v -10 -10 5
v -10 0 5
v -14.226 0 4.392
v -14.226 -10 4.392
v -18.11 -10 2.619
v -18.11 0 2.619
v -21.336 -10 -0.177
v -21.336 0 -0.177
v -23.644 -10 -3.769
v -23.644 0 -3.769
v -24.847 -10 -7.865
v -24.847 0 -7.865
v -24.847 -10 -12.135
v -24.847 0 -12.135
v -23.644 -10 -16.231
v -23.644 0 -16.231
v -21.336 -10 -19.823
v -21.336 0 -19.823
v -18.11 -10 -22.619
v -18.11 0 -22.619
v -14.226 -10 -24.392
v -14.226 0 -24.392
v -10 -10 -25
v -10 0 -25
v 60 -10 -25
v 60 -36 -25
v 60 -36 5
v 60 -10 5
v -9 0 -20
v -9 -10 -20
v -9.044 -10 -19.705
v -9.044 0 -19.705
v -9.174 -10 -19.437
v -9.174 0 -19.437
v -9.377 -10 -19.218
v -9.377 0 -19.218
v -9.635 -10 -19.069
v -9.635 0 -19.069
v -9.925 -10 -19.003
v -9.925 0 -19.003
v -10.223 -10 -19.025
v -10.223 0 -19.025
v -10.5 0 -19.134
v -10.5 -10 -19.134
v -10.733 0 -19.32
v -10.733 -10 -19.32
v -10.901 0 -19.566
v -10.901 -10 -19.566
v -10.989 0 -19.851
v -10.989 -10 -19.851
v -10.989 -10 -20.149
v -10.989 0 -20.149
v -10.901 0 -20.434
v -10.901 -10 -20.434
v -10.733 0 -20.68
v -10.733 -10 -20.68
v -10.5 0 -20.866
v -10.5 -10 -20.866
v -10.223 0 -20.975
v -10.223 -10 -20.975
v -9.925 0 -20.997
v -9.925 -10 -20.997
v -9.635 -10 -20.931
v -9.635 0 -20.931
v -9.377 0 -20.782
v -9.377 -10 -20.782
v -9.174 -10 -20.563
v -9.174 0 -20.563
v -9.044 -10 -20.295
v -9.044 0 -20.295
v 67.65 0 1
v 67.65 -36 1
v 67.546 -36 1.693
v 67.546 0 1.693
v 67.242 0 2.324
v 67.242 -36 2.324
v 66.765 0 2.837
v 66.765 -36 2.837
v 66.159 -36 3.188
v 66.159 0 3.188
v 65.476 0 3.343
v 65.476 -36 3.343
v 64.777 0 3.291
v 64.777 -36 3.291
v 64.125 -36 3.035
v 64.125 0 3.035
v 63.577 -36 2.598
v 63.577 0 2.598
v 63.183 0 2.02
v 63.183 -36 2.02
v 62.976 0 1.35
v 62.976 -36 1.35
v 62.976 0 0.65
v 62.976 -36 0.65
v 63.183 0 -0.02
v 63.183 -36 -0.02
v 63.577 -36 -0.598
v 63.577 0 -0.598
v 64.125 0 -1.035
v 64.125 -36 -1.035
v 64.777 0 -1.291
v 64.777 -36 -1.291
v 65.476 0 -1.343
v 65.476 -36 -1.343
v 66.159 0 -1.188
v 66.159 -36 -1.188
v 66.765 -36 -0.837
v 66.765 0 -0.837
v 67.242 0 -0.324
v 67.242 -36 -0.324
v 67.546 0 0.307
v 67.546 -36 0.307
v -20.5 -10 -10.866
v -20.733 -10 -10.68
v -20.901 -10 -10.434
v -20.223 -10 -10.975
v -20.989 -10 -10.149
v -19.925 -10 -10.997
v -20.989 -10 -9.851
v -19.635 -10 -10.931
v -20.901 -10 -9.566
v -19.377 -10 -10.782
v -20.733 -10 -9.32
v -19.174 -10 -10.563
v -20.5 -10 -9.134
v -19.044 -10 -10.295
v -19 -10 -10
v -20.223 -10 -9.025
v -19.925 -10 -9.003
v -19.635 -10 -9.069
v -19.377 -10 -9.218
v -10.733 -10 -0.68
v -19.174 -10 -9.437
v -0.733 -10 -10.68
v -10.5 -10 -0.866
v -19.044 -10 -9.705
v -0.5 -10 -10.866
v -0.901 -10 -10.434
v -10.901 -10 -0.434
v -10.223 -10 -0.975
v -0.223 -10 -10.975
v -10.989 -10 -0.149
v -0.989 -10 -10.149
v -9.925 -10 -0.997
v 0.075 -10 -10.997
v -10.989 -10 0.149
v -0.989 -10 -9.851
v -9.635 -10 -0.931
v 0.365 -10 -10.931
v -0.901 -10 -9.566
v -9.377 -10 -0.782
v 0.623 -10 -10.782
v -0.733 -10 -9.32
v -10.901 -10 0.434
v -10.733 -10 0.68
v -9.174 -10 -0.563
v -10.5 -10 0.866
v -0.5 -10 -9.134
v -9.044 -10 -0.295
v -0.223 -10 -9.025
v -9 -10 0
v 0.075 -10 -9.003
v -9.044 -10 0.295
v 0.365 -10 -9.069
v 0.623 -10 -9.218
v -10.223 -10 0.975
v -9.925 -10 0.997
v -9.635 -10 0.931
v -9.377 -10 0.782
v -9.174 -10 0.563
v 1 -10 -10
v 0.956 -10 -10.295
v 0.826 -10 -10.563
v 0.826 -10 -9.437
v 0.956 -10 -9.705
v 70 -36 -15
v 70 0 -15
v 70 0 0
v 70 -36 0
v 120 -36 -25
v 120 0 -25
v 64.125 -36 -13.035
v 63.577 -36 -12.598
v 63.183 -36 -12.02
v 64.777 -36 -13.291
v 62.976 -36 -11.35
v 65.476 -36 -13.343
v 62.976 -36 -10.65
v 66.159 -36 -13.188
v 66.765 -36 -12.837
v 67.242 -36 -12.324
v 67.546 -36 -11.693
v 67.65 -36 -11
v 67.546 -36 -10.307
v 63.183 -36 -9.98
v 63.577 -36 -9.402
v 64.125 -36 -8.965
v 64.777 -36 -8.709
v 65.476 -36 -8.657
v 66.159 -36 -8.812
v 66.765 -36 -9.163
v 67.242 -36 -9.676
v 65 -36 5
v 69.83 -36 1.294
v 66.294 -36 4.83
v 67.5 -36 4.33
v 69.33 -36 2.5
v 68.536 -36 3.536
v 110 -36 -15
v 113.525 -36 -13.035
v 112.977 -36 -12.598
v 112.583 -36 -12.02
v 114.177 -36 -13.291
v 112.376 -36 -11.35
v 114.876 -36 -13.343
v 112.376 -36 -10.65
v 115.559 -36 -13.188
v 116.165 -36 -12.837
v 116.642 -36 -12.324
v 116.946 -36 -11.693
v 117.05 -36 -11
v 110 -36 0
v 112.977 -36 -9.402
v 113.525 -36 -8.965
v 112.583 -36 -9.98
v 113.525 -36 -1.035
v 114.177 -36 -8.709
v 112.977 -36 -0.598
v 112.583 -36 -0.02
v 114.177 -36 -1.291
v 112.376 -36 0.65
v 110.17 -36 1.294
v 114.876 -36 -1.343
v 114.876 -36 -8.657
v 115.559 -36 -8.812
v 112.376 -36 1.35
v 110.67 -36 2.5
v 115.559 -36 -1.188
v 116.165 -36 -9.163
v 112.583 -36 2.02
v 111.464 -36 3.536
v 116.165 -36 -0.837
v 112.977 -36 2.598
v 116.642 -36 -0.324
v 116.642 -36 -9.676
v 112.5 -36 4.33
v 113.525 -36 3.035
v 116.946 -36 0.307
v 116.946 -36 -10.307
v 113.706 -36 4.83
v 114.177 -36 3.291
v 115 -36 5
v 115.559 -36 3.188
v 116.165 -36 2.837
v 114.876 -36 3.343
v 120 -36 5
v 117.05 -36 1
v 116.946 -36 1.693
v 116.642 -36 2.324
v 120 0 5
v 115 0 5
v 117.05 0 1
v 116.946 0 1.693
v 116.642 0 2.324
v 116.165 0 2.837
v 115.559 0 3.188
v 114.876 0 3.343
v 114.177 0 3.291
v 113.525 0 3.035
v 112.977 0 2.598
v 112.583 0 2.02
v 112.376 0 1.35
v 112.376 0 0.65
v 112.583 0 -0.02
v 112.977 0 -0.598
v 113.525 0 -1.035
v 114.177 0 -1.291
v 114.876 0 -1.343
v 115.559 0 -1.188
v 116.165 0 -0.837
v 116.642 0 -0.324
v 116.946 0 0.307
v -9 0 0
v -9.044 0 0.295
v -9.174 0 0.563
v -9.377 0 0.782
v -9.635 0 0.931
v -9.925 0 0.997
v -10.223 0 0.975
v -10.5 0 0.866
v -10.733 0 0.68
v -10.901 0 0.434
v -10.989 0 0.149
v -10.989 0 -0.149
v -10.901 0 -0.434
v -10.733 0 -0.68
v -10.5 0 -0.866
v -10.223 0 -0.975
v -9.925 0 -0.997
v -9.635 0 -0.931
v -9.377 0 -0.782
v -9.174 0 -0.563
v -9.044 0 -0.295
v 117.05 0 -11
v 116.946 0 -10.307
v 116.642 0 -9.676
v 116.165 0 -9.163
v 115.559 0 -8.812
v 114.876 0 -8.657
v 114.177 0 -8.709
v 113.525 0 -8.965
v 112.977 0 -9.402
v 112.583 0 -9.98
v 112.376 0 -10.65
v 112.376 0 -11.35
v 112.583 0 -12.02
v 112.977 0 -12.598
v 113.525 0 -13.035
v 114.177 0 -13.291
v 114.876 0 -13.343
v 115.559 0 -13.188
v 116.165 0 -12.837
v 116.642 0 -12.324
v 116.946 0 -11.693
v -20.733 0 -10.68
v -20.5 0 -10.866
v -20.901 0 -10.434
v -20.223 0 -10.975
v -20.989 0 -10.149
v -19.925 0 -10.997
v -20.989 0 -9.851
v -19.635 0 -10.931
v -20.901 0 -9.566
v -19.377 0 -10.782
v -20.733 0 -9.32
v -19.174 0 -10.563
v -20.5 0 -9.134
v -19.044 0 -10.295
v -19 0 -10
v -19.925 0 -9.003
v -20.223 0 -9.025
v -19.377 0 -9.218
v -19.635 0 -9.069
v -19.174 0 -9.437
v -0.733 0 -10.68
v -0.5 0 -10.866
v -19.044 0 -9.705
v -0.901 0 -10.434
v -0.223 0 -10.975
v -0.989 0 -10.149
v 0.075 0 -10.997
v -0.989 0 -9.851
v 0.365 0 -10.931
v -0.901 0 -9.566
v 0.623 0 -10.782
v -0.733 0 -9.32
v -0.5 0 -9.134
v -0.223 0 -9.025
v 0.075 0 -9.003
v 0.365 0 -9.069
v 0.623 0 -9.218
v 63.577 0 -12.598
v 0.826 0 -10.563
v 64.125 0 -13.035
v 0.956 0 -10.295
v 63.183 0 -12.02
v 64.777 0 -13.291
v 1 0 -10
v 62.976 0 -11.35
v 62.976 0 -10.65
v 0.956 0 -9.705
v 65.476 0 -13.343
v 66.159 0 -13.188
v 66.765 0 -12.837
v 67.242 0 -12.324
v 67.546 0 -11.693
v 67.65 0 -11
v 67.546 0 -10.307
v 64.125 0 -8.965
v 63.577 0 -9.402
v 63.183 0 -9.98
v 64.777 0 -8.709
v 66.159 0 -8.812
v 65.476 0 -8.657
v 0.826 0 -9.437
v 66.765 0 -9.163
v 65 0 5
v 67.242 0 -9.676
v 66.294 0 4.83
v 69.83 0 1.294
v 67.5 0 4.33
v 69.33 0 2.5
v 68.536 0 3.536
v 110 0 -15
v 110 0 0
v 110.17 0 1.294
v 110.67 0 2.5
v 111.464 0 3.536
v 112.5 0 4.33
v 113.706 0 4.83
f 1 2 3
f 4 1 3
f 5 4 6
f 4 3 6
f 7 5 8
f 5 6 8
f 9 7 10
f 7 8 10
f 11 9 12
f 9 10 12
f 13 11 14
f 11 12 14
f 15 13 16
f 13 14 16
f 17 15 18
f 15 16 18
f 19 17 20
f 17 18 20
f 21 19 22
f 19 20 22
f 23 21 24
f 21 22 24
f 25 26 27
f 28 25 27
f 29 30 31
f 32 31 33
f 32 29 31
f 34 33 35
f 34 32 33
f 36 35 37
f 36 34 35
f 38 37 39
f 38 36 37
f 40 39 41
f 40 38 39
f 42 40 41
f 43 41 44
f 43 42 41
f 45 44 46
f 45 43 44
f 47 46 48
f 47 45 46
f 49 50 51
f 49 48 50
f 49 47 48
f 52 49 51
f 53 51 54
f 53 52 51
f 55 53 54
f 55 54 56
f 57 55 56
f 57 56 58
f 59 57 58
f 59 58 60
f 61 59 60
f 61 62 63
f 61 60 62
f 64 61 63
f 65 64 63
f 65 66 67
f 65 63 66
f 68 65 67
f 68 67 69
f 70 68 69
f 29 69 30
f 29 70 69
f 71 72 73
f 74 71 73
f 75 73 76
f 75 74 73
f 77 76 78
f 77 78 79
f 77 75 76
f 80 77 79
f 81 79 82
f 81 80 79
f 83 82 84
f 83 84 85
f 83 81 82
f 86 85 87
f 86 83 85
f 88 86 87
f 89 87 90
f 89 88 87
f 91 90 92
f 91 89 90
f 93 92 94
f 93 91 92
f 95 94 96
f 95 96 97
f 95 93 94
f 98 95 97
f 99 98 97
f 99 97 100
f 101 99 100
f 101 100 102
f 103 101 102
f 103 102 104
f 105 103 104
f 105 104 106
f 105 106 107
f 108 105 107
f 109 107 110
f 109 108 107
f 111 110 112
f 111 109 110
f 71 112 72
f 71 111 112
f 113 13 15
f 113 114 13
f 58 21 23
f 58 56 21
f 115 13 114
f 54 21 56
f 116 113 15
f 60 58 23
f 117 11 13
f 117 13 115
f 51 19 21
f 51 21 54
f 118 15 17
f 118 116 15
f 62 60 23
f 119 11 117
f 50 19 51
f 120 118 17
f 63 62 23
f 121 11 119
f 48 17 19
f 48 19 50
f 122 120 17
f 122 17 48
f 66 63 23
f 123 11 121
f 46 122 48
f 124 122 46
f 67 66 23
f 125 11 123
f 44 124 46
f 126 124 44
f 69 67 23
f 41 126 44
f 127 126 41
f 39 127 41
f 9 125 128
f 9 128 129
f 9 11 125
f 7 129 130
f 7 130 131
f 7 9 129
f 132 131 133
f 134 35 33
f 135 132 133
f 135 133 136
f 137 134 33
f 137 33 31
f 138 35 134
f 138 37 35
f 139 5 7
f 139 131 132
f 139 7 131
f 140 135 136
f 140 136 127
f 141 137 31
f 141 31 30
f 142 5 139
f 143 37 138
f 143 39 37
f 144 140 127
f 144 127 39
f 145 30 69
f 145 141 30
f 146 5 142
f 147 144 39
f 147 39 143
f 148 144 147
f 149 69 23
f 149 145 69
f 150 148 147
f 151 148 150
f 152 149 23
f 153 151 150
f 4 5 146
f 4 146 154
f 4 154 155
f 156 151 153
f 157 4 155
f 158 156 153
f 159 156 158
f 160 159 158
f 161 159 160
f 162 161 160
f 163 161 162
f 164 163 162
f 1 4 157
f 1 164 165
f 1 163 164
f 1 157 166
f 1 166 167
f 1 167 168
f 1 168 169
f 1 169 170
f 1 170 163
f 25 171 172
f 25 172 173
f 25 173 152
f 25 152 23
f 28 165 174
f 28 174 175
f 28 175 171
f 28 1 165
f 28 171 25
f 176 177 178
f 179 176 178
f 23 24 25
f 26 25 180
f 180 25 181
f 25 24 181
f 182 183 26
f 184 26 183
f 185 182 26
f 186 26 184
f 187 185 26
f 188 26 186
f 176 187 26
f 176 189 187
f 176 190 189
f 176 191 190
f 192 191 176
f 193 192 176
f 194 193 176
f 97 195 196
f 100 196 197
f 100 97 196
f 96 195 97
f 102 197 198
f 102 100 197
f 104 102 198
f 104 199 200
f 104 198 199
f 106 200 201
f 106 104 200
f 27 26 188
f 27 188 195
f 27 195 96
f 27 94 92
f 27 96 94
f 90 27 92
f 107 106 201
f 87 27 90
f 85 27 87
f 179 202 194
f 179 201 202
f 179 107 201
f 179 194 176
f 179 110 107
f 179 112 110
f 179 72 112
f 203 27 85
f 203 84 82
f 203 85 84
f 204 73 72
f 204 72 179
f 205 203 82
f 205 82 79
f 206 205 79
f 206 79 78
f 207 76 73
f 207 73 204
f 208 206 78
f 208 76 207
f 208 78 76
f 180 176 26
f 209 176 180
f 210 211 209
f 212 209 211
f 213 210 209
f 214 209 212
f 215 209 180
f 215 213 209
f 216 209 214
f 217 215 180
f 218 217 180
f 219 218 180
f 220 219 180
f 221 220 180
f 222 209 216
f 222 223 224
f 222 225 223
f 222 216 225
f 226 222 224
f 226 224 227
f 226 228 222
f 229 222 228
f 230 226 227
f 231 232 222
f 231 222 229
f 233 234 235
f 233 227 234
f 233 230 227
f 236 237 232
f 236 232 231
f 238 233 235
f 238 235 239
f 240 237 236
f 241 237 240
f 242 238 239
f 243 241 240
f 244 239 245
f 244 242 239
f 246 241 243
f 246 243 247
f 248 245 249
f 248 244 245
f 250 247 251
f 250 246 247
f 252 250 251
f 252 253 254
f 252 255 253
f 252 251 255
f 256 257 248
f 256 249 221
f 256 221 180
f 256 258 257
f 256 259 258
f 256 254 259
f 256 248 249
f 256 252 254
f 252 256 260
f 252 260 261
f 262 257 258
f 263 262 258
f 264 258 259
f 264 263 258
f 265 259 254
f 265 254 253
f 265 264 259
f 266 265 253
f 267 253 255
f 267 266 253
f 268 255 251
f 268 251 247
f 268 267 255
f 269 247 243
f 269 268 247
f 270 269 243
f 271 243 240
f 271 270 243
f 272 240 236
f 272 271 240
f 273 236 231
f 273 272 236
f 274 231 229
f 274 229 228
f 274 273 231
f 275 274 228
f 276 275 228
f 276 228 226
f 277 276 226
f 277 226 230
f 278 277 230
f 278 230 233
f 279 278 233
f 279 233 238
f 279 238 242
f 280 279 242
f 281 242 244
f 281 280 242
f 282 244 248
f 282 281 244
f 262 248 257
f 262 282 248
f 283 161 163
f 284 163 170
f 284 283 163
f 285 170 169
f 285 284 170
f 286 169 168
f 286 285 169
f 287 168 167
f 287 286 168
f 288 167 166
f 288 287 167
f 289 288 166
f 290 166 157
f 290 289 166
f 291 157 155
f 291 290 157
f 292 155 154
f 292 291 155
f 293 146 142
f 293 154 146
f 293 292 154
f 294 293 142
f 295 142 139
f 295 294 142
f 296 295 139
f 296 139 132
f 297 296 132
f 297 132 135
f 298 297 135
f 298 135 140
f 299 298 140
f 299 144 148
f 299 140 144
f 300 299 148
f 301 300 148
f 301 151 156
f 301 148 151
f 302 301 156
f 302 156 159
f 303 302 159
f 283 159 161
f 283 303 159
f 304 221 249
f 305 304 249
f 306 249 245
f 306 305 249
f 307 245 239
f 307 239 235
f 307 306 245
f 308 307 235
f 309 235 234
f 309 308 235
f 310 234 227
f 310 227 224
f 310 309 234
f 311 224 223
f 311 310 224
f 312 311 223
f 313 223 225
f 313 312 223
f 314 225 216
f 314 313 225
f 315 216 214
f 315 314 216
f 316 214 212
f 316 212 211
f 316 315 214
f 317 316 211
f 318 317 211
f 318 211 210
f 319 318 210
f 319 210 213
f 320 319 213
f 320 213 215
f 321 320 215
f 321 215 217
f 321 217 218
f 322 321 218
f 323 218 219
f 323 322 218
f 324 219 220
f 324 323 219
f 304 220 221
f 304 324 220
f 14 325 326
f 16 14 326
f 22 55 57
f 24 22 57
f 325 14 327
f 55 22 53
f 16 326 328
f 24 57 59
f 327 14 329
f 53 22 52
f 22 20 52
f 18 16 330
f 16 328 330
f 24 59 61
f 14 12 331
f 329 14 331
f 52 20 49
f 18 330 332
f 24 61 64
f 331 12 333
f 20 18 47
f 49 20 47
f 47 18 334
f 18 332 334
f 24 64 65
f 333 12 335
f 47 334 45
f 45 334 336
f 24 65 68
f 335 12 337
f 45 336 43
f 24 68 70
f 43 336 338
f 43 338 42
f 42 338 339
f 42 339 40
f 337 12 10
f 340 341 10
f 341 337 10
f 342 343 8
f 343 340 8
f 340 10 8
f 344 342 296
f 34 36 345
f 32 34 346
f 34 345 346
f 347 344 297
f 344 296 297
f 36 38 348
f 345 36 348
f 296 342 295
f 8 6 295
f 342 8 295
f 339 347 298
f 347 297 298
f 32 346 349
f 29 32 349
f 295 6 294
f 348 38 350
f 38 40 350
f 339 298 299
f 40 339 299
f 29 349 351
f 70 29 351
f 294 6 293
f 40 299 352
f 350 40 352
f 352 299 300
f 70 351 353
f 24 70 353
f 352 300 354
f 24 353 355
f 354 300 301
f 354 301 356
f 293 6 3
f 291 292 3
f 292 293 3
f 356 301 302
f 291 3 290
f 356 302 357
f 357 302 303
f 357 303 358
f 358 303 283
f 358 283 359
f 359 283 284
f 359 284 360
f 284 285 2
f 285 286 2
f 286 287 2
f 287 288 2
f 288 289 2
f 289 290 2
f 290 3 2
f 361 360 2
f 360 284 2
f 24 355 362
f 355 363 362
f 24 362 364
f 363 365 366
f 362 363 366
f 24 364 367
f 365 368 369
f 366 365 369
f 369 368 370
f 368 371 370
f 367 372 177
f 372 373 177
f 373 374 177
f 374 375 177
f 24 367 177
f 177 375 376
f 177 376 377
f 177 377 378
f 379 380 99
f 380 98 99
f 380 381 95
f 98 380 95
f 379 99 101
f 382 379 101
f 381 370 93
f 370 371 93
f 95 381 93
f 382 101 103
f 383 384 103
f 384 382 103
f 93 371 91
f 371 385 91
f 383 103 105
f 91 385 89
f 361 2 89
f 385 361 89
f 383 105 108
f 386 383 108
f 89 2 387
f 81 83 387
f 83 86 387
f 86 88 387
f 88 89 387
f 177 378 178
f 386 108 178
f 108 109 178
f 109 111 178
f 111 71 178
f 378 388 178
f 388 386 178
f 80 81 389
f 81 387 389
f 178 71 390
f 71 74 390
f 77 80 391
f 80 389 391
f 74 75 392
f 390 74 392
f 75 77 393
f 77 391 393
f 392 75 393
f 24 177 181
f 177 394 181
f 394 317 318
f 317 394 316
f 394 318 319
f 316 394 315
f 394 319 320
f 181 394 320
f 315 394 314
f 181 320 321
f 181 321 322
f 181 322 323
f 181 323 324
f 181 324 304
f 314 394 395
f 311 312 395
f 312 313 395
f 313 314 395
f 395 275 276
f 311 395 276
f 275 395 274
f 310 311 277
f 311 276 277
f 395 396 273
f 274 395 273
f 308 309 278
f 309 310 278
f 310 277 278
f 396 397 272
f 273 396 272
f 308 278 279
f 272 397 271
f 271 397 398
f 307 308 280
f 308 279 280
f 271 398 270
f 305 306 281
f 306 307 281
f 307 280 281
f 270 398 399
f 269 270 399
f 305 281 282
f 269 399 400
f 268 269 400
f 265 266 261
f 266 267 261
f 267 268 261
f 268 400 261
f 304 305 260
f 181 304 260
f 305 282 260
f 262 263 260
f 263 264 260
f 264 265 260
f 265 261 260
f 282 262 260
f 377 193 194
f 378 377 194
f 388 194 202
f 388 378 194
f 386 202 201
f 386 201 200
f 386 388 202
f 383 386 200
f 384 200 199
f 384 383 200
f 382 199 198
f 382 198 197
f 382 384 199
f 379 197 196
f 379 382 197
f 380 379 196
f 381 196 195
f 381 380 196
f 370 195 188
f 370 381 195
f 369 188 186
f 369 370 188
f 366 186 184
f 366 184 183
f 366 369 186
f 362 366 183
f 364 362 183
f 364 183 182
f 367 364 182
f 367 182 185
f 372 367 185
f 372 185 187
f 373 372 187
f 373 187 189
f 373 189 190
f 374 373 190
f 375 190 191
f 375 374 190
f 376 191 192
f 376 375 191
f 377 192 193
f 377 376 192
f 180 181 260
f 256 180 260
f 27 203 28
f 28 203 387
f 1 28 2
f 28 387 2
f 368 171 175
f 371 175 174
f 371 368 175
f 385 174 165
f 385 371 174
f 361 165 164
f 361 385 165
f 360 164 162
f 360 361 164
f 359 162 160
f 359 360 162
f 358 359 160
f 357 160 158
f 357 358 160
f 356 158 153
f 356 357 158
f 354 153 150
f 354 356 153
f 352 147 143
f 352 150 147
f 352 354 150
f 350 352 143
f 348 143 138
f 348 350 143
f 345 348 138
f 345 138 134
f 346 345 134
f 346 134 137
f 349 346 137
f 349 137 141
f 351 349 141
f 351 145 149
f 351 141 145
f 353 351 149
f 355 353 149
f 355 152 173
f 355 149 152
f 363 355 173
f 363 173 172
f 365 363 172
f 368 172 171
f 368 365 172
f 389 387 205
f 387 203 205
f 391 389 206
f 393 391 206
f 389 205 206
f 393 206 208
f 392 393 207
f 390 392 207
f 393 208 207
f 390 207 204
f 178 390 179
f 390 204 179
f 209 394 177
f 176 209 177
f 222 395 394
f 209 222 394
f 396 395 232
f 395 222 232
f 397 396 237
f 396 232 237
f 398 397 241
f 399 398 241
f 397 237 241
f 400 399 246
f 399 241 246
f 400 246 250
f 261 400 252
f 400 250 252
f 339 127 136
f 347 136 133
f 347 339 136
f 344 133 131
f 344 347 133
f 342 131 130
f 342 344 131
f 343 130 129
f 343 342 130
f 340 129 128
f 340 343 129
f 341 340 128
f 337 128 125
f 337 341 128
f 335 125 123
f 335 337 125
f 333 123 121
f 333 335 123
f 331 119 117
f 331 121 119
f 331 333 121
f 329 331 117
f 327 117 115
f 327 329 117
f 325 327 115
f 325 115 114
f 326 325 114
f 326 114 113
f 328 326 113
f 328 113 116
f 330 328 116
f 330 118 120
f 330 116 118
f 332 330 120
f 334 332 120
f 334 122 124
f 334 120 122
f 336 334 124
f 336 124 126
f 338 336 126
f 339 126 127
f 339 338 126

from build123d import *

# Parameters (mm, degrees)
F0_R     = 1
F0_R_2   = 2.35
F1_DEPTH = 36
F2_W     = 275.678707
F2_H     = 30
F3_DEPTH = 26
F4_R     = 5


with BuildPart() as f1:
    # F0 (on Front) → F1 (new body)
    with BuildSketch(Plane.XZ):
        with BuildLine():
            Line((70, 5), (-10, 5))
            ThreePointArc((-10, 5), (-25, -10), (-10, -25))
            Line((-10, -25), (120, -25))
            Line((120, -25), (120, 5))
            Line((120, 5), (110, 5))
            Line((110, 5), (110, -15))
            Line((110, -15), (70, -15))
            Line((70, -15), (70, 5))
        make_face()
        with Locations((-10, -20)):
            Circle(F0_R, mode=Mode.SUBTRACT)
        with Locations((65.3, -11)):
            Circle(F0_R_2, mode=Mode.SUBTRACT)
        with Locations((114.7, -11)):
            Circle(F0_R_2, mode=Mode.SUBTRACT)
        with Locations((-20, -10)):
            Circle(F0_R, mode=Mode.SUBTRACT)
        with Locations((0, -10)):
            Circle(F0_R, mode=Mode.SUBTRACT)
        with Locations((-10, 0)):
            Circle(F0_R, mode=Mode.SUBTRACT)
        with Locations((65.3, 1)):
            Circle(F0_R_2, mode=Mode.SUBTRACT)
        with Locations((114.7, 1)):
            Circle(F0_R_2, mode=Mode.SUBTRACT)
    extrude(amount=F1_DEPTH)

    # F2 (on face) → F3 (cut)
    with BuildSketch(Plane.XZ.offset(36)):
        with Locations((-77.839354, -10)):
            Rectangle(F2_W, F2_H)
    extrude(amount=-F3_DEPTH, mode=Mode.SUBTRACT)

    # F4
    f4_edges = [f1.edges().sort_by_distance(p)[0] for p in [
        (110, -18, 5),
        (70, -18, 5),
    ]]
    fillet(f4_edges, radius=F4_R)


solid = f1.part
